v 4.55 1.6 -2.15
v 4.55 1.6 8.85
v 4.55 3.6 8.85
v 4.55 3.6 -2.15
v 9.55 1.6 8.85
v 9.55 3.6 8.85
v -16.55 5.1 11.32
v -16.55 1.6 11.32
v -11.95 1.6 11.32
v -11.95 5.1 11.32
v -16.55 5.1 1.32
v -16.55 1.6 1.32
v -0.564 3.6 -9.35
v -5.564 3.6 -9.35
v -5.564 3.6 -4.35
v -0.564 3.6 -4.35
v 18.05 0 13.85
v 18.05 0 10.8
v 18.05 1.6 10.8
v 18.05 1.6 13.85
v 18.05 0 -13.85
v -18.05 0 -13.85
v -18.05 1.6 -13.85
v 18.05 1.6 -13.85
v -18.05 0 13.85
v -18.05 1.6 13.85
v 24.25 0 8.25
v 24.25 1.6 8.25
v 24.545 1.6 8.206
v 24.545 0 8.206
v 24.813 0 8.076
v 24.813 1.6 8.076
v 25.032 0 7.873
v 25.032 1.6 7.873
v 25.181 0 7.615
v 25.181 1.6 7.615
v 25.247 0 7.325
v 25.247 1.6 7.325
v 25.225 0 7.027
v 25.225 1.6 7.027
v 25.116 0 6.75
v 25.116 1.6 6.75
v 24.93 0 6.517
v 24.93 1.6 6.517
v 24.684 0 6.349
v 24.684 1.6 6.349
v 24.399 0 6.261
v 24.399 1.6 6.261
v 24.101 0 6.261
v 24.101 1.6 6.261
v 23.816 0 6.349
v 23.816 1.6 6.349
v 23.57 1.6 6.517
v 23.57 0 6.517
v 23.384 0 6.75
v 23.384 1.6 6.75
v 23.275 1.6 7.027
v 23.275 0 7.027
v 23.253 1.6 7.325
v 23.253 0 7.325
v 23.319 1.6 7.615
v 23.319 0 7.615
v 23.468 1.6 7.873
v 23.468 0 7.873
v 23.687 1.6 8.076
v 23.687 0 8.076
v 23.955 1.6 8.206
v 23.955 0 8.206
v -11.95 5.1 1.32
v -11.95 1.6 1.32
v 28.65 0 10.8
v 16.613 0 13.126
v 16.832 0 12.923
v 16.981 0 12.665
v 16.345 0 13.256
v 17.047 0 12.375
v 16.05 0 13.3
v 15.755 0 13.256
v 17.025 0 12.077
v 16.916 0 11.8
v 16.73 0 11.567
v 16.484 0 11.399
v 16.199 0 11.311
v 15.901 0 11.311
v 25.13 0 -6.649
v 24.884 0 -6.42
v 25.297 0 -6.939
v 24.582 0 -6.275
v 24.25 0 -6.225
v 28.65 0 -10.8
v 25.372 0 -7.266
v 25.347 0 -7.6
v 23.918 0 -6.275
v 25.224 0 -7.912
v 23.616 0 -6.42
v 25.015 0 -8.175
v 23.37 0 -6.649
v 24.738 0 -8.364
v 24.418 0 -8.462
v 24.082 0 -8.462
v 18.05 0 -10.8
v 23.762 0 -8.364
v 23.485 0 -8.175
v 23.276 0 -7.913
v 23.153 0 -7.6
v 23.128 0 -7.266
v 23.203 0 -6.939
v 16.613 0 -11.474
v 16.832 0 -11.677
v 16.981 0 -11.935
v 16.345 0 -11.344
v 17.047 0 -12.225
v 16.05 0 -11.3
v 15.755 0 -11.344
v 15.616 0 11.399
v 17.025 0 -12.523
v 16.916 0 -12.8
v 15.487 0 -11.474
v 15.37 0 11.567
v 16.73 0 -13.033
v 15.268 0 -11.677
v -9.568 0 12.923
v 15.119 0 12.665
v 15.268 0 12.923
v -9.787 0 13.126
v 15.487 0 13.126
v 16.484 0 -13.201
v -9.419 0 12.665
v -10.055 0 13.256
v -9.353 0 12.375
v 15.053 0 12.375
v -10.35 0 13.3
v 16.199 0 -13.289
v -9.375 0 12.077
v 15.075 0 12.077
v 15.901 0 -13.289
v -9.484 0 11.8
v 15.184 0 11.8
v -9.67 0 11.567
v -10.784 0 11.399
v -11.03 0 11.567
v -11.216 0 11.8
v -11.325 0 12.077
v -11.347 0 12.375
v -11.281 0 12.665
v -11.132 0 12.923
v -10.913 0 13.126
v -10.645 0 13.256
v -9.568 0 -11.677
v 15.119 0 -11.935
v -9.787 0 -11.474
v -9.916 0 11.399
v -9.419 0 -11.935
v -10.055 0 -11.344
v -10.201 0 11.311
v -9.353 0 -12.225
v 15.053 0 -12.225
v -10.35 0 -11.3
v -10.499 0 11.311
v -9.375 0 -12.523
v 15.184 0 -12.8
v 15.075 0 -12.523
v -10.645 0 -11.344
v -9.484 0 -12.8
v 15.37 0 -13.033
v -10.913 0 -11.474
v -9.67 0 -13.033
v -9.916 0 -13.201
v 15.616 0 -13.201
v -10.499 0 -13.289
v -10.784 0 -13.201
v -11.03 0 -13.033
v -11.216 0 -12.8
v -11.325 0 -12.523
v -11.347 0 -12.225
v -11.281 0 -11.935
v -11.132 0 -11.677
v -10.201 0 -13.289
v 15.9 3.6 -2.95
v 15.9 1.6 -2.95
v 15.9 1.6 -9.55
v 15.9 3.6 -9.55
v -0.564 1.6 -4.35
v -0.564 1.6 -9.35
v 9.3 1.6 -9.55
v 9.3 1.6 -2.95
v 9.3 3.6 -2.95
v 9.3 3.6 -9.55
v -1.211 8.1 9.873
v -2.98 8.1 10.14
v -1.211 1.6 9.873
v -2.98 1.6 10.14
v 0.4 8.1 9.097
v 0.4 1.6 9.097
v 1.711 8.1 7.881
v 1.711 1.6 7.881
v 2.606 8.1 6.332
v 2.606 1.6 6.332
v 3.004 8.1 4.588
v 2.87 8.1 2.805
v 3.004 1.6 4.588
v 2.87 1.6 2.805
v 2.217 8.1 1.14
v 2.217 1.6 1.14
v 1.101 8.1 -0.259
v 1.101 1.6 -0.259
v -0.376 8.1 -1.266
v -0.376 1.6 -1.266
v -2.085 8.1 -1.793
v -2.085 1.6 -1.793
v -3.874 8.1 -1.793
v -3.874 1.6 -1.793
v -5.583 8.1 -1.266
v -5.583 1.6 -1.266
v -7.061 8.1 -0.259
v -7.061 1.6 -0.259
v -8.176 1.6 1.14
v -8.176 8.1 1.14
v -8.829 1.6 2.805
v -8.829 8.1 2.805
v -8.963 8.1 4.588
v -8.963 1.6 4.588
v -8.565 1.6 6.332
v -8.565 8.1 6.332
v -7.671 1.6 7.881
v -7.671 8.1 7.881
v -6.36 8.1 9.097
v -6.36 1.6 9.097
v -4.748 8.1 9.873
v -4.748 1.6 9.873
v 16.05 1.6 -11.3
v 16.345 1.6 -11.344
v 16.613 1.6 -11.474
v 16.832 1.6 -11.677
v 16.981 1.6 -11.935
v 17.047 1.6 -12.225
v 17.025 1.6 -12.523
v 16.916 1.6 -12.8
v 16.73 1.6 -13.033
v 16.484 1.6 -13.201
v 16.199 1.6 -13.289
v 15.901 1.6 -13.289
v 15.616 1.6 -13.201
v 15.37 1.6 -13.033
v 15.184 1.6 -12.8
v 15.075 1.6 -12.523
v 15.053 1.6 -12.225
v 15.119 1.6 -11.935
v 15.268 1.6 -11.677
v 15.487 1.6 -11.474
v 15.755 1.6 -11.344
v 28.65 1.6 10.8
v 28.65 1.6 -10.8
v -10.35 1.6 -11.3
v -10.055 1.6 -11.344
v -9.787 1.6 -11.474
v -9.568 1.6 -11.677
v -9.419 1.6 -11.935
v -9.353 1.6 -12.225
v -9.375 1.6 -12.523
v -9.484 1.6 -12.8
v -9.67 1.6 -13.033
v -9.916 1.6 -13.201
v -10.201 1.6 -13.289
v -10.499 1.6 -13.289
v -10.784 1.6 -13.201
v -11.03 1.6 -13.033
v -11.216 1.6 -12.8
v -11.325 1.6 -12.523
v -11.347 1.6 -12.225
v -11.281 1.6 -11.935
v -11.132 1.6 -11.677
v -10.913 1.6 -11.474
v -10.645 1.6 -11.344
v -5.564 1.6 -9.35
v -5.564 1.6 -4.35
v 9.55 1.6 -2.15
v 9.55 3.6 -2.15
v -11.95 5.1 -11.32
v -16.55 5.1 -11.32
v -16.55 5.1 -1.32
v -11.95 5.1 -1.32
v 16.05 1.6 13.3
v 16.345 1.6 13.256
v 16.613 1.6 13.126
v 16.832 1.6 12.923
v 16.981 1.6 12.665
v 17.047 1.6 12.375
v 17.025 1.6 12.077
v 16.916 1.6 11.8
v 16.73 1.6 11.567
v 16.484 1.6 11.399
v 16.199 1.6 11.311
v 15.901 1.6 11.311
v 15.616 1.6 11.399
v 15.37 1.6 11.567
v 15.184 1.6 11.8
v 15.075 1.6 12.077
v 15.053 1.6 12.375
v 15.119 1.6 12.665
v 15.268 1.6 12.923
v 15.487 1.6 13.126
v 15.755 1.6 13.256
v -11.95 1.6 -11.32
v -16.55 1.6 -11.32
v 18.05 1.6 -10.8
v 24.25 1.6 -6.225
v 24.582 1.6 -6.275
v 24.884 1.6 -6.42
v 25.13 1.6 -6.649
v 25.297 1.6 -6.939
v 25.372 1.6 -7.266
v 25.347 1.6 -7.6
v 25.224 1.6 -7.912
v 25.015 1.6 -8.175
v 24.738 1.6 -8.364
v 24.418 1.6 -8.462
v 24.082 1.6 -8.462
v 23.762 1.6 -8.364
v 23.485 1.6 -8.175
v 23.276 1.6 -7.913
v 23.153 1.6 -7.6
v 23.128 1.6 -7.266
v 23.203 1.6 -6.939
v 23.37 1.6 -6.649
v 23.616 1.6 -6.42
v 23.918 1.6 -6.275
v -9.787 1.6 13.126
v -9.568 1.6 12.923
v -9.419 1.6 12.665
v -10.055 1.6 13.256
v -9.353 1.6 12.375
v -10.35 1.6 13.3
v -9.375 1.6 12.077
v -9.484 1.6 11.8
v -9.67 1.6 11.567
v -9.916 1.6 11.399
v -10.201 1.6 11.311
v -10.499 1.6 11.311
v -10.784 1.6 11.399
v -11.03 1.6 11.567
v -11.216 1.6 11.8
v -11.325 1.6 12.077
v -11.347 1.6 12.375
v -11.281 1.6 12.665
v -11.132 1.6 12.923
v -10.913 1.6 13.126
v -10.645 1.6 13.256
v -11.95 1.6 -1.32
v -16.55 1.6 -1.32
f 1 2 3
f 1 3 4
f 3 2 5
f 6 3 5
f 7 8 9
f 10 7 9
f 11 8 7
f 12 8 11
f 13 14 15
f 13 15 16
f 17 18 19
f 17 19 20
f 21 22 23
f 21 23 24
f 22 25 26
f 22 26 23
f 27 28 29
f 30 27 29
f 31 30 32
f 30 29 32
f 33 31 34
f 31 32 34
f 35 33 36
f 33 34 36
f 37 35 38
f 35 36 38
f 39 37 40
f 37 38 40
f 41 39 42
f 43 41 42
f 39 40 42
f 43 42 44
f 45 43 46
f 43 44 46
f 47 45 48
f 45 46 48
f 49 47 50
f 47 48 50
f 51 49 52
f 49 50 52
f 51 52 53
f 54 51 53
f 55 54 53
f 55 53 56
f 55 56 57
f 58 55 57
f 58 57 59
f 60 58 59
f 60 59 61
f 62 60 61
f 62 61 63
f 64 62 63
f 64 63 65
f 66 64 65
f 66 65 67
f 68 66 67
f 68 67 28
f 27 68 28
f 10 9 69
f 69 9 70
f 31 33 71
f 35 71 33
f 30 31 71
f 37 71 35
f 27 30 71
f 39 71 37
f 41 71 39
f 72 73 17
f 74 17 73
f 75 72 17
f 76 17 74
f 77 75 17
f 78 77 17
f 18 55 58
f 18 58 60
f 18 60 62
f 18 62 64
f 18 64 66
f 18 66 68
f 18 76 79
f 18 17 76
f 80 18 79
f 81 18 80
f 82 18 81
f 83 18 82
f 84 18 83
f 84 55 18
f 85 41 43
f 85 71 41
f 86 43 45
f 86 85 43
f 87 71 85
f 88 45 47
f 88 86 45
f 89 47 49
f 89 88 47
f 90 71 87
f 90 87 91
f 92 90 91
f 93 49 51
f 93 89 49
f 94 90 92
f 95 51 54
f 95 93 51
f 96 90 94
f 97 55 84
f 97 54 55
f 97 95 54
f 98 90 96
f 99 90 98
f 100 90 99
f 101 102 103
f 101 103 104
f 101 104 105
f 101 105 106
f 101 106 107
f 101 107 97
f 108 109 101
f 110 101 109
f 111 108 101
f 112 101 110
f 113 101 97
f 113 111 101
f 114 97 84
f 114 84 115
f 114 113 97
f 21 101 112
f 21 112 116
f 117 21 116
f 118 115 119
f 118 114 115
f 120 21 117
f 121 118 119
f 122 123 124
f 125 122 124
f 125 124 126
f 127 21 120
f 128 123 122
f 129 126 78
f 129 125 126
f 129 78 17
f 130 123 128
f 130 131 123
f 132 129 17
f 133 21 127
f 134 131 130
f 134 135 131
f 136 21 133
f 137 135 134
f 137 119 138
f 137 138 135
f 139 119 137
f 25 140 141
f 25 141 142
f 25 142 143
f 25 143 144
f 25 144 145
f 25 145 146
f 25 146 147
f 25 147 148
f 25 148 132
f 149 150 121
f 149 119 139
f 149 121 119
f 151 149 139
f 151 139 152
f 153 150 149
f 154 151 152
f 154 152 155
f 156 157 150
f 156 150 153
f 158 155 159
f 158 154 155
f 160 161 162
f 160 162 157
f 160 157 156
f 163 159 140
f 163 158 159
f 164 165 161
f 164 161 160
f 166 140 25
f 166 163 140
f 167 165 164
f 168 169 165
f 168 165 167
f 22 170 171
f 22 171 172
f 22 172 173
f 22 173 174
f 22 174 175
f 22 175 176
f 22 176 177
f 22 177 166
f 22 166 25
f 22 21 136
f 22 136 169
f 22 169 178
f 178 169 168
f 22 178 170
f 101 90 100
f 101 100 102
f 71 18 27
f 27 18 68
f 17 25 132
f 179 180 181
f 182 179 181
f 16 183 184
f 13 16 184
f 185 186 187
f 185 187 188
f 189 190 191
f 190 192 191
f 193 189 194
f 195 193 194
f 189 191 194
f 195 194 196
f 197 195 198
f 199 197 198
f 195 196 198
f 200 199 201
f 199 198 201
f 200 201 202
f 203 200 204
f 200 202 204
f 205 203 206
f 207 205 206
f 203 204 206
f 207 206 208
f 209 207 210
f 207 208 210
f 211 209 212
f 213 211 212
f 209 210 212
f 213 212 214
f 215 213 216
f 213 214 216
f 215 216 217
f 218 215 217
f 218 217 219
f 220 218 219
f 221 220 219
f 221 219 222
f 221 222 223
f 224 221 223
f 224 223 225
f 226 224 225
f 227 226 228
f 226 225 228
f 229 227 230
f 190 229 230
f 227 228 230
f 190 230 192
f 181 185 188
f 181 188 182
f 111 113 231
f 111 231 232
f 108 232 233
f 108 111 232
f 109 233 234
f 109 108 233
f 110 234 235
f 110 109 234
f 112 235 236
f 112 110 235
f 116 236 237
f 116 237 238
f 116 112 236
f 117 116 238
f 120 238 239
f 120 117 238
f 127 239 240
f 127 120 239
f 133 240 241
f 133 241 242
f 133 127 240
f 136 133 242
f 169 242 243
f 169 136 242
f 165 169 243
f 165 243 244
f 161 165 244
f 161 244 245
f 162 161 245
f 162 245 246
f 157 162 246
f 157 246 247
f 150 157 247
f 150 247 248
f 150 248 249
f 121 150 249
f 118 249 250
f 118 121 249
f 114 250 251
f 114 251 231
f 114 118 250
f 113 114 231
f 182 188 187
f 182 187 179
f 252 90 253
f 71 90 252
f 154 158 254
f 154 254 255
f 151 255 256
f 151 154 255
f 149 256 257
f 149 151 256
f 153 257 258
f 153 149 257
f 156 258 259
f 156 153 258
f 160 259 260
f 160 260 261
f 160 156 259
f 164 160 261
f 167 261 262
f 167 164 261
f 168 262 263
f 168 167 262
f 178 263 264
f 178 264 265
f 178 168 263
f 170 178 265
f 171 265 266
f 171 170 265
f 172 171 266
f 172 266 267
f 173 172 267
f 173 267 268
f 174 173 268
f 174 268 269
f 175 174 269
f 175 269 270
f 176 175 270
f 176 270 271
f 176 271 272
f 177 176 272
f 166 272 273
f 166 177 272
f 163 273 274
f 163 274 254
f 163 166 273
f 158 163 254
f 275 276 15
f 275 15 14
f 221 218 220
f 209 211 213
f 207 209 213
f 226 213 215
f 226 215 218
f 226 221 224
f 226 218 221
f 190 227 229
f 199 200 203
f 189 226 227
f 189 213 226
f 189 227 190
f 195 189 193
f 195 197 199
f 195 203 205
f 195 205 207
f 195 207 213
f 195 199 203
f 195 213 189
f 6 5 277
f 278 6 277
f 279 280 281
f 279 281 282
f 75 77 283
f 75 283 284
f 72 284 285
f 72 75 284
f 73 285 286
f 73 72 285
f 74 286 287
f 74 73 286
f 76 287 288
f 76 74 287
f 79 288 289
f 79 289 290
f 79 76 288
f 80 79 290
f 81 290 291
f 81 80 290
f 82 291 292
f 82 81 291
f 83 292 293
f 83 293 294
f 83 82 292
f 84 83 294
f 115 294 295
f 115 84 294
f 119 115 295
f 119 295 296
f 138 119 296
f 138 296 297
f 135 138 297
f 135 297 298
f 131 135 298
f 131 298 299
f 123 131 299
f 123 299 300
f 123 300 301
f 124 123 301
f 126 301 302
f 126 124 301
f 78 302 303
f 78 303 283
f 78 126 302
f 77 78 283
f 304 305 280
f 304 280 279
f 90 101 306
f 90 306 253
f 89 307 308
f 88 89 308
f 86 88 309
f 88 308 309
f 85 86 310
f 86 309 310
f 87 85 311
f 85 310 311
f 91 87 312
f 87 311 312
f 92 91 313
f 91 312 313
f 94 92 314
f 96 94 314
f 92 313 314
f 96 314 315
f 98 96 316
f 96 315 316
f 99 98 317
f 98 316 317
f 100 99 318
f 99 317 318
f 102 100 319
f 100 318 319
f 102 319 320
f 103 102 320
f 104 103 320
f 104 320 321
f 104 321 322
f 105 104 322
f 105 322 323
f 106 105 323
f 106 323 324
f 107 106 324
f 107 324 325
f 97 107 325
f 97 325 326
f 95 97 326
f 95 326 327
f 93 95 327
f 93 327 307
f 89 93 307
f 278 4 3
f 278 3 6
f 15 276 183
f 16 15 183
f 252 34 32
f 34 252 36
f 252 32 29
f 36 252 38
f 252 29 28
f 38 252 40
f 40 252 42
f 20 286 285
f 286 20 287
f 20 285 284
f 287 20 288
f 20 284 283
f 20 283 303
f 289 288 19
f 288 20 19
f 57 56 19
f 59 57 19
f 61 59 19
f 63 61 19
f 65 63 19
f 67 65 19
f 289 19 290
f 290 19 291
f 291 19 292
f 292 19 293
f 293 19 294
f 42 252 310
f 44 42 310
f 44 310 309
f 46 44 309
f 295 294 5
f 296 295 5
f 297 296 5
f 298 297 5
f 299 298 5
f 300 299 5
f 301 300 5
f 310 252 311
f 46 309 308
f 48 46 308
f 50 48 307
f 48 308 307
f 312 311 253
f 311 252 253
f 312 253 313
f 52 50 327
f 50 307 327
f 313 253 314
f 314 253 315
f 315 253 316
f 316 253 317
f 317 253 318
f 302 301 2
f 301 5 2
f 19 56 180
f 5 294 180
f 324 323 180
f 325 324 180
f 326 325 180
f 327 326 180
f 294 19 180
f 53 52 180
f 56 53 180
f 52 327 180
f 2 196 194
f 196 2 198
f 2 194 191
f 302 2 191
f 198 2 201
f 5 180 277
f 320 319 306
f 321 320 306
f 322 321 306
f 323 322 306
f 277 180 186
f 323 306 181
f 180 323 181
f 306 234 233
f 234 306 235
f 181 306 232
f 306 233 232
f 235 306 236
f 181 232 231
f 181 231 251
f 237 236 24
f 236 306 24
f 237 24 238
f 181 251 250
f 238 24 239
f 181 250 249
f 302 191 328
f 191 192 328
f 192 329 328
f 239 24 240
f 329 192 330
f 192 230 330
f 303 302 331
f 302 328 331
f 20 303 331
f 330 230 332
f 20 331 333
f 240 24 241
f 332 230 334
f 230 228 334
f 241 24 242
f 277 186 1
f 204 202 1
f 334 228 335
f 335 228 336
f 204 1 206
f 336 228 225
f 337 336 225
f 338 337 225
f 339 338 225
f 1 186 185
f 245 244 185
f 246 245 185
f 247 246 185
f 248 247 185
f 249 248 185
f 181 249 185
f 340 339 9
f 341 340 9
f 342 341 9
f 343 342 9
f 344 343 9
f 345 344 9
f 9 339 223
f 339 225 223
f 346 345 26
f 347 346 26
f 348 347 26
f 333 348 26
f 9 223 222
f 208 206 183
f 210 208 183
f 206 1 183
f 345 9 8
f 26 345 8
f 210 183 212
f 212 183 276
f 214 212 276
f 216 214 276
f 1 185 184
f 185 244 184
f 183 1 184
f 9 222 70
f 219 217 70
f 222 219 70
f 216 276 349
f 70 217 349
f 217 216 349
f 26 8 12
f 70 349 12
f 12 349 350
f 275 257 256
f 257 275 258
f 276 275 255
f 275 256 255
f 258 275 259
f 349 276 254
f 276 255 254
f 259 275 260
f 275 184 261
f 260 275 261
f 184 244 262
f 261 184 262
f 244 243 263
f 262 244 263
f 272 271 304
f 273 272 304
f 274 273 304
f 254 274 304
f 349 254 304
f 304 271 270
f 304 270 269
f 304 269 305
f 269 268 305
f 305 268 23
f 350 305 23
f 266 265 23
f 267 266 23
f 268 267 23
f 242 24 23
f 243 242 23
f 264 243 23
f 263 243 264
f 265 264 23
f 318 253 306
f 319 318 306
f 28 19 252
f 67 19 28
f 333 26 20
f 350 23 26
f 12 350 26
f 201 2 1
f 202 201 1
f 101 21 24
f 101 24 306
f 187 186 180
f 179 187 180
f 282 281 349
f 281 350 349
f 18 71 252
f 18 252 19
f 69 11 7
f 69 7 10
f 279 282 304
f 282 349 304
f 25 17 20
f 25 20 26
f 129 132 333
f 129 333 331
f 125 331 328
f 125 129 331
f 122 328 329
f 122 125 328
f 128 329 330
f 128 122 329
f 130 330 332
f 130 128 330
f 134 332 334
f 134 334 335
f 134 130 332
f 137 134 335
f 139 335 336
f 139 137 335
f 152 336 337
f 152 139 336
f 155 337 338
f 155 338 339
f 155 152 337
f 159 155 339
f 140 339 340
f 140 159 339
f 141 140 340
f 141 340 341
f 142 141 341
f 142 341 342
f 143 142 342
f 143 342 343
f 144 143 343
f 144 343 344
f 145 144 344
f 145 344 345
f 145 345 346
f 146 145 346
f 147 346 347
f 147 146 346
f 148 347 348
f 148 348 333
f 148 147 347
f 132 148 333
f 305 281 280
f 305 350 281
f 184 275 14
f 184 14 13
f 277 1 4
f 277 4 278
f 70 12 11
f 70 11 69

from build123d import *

# Parameters (mm, degrees)
CROQUIS1_R              = 1
SALIENTE_EXTRUIR1_DEPTH = 1.6
CROQUIS2_R              = 1
CORTAR_EXTRUIR1_DEPTH   = 10
CROQUIS3_R              = 6
CROQUIS3_W              = 4.6
CROQUIS3_H              = 10
CROQUIS3_W_2            = 6.6
CROQUIS3_H_2            = 6.6
CROQUIS3_W_3            = 5
CROQUIS3_H_3            = 11
CROQUIS3_H_4            = 5
SALIENTE_EXTRUIR2_DEPTH = 2
CROQUIS4_R              = 6
SALIENTE_EXTRUIR3_DEPTH = 4.5
CROQUIS5_W              = 4.6
CROQUIS5_H              = 10
SALIENTE_EXTRUIR4_DEPTH = 1.5
CROQUIS7_R              = 1.122052982
SALIENTE_EXTRUIR5_DEPTH = 1.6
CROQUIS9_R              = 1.125
CORTAR_EXTRUIR2_DEPTH   = 33.479147156


with BuildPart() as part:
    # Croquis1 → Saliente-Extruir1 (new body)
    with BuildSketch(Plane(origin=(0, 0, 0), x_dir=(1, 0, 0), z_dir=(0, 1, 0))):
        Polygon((-18.05, 13.85), (18.05, 13.85), (18.05, 10.8), (28.65, 10.8), (28.65, -10.8), (18.05, -10.8), (18.05, -13.85), (-18.05, -13.85), align=None)
        with Locations(Location((-10.35, -12.3, 0), (0, 0, 270))):
            Circle(CROQUIS1_R, mode=Mode.SUBTRACT)
        with Locations(Location((16.05, -12.3, 0), (0, 0, 270))):
            Circle(CROQUIS1_R, mode=Mode.SUBTRACT)
        with Locations(Location((16.05, 12.3, 0), (0, 0, 270))):
            Circle(CROQUIS1_R, mode=Mode.SUBTRACT)
        with Locations(Location((-10.35, 12.3, 0), (0, 0, 270))):
            Circle(CROQUIS1_R, mode=Mode.SUBTRACT)
    extrude(amount=SALIENTE_EXTRUIR1_DEPTH)

    # Croquis2 → Cortar-Extruir1 (cut)
    with BuildSketch(Plane(origin=(0, 1.6, 0), x_dir=(1, 0, 0), z_dir=(0, 1, 0))):
        with Locations(Location((24.25, 7.25, 0), (0, 0, 270))):
            Circle(CROQUIS2_R)
        with Locations(Location((24.25, -7.25, 0), (0, 0, 270))):
            Circle(CROQUIS2_R)
    extrude(amount=-CORTAR_EXTRUIR1_DEPTH, mode=Mode.SUBTRACT)

    # Croquis3 → Saliente-Extruir2 (add)
    with BuildSketch(Plane(origin=(0, 1.6, 0), x_dir=(1, 0, 0), z_dir=(0, 1, 0))):
        with Locations(Location((-2.979600995, -4.139800498, 0), (0, 0, 270))):
            Circle(CROQUIS3_R)
        with Locations((-14.25, 6.32)):
            Rectangle(CROQUIS3_W, CROQUIS3_H)
        with Locations((-14.25, -6.32)):
            Rectangle(CROQUIS3_W, CROQUIS3_H)
        with Locations((12.6, 6.25)):
            Rectangle(CROQUIS3_W_2, CROQUIS3_H_2)
        with Locations((7.05, -3.35)):
            Rectangle(CROQUIS3_W_3, CROQUIS3_H_3)
        with Locations((-3.063985121, 6.85)):
            Rectangle(CROQUIS3_W_3, CROQUIS3_H_4)
    extrude(amount=SALIENTE_EXTRUIR2_DEPTH)

    # Croquis4 → Saliente-Extruir3 (add)
    with BuildSketch(Plane(origin=(0, 3.6, 0), x_dir=(1, 0, 0), z_dir=(0, 1, 0))):
        with Locations(Location((-2.979600995, -4.139800498, 0), (0, 0, 270))):
            Circle(CROQUIS4_R)
    extrude(amount=SALIENTE_EXTRUIR3_DEPTH)

    # Croquis5 → Saliente-Extruir4 (add)
    with BuildSketch(Plane(origin=(0, 3.6, 0), x_dir=(1, 0, 0), z_dir=(0, 1, 0))):
        with Locations((-14.25, 6.32)):
            Rectangle(CROQUIS5_W, CROQUIS5_H)
        with Locations((-14.25, -6.32)):
            Rectangle(CROQUIS5_W, CROQUIS5_H)
    extrude(amount=SALIENTE_EXTRUIR4_DEPTH)

    # Croquis7 → Saliente-Extruir5 (add)
    with BuildSketch(Plane.XZ):
        with Locations((24.25, -7.25)):
            Circle(CROQUIS7_R)
    extrude(amount=-SALIENTE_EXTRUIR5_DEPTH)

    # Croquis9 → Cortar-Extruir2 (cut, through all)
    with BuildSketch(Plane(origin=(0, 1.6, 0), x_dir=(1, 0, 0), z_dir=(0, 1, 0))):
        with Locations(Location((24.25, 7.35, 0), (0, 0, 270))):
            Circle(CROQUIS9_R)
    extrude(amount=-CORTAR_EXTRUIR2_DEPTH, mode=Mode.SUBTRACT)


solid = part.part
